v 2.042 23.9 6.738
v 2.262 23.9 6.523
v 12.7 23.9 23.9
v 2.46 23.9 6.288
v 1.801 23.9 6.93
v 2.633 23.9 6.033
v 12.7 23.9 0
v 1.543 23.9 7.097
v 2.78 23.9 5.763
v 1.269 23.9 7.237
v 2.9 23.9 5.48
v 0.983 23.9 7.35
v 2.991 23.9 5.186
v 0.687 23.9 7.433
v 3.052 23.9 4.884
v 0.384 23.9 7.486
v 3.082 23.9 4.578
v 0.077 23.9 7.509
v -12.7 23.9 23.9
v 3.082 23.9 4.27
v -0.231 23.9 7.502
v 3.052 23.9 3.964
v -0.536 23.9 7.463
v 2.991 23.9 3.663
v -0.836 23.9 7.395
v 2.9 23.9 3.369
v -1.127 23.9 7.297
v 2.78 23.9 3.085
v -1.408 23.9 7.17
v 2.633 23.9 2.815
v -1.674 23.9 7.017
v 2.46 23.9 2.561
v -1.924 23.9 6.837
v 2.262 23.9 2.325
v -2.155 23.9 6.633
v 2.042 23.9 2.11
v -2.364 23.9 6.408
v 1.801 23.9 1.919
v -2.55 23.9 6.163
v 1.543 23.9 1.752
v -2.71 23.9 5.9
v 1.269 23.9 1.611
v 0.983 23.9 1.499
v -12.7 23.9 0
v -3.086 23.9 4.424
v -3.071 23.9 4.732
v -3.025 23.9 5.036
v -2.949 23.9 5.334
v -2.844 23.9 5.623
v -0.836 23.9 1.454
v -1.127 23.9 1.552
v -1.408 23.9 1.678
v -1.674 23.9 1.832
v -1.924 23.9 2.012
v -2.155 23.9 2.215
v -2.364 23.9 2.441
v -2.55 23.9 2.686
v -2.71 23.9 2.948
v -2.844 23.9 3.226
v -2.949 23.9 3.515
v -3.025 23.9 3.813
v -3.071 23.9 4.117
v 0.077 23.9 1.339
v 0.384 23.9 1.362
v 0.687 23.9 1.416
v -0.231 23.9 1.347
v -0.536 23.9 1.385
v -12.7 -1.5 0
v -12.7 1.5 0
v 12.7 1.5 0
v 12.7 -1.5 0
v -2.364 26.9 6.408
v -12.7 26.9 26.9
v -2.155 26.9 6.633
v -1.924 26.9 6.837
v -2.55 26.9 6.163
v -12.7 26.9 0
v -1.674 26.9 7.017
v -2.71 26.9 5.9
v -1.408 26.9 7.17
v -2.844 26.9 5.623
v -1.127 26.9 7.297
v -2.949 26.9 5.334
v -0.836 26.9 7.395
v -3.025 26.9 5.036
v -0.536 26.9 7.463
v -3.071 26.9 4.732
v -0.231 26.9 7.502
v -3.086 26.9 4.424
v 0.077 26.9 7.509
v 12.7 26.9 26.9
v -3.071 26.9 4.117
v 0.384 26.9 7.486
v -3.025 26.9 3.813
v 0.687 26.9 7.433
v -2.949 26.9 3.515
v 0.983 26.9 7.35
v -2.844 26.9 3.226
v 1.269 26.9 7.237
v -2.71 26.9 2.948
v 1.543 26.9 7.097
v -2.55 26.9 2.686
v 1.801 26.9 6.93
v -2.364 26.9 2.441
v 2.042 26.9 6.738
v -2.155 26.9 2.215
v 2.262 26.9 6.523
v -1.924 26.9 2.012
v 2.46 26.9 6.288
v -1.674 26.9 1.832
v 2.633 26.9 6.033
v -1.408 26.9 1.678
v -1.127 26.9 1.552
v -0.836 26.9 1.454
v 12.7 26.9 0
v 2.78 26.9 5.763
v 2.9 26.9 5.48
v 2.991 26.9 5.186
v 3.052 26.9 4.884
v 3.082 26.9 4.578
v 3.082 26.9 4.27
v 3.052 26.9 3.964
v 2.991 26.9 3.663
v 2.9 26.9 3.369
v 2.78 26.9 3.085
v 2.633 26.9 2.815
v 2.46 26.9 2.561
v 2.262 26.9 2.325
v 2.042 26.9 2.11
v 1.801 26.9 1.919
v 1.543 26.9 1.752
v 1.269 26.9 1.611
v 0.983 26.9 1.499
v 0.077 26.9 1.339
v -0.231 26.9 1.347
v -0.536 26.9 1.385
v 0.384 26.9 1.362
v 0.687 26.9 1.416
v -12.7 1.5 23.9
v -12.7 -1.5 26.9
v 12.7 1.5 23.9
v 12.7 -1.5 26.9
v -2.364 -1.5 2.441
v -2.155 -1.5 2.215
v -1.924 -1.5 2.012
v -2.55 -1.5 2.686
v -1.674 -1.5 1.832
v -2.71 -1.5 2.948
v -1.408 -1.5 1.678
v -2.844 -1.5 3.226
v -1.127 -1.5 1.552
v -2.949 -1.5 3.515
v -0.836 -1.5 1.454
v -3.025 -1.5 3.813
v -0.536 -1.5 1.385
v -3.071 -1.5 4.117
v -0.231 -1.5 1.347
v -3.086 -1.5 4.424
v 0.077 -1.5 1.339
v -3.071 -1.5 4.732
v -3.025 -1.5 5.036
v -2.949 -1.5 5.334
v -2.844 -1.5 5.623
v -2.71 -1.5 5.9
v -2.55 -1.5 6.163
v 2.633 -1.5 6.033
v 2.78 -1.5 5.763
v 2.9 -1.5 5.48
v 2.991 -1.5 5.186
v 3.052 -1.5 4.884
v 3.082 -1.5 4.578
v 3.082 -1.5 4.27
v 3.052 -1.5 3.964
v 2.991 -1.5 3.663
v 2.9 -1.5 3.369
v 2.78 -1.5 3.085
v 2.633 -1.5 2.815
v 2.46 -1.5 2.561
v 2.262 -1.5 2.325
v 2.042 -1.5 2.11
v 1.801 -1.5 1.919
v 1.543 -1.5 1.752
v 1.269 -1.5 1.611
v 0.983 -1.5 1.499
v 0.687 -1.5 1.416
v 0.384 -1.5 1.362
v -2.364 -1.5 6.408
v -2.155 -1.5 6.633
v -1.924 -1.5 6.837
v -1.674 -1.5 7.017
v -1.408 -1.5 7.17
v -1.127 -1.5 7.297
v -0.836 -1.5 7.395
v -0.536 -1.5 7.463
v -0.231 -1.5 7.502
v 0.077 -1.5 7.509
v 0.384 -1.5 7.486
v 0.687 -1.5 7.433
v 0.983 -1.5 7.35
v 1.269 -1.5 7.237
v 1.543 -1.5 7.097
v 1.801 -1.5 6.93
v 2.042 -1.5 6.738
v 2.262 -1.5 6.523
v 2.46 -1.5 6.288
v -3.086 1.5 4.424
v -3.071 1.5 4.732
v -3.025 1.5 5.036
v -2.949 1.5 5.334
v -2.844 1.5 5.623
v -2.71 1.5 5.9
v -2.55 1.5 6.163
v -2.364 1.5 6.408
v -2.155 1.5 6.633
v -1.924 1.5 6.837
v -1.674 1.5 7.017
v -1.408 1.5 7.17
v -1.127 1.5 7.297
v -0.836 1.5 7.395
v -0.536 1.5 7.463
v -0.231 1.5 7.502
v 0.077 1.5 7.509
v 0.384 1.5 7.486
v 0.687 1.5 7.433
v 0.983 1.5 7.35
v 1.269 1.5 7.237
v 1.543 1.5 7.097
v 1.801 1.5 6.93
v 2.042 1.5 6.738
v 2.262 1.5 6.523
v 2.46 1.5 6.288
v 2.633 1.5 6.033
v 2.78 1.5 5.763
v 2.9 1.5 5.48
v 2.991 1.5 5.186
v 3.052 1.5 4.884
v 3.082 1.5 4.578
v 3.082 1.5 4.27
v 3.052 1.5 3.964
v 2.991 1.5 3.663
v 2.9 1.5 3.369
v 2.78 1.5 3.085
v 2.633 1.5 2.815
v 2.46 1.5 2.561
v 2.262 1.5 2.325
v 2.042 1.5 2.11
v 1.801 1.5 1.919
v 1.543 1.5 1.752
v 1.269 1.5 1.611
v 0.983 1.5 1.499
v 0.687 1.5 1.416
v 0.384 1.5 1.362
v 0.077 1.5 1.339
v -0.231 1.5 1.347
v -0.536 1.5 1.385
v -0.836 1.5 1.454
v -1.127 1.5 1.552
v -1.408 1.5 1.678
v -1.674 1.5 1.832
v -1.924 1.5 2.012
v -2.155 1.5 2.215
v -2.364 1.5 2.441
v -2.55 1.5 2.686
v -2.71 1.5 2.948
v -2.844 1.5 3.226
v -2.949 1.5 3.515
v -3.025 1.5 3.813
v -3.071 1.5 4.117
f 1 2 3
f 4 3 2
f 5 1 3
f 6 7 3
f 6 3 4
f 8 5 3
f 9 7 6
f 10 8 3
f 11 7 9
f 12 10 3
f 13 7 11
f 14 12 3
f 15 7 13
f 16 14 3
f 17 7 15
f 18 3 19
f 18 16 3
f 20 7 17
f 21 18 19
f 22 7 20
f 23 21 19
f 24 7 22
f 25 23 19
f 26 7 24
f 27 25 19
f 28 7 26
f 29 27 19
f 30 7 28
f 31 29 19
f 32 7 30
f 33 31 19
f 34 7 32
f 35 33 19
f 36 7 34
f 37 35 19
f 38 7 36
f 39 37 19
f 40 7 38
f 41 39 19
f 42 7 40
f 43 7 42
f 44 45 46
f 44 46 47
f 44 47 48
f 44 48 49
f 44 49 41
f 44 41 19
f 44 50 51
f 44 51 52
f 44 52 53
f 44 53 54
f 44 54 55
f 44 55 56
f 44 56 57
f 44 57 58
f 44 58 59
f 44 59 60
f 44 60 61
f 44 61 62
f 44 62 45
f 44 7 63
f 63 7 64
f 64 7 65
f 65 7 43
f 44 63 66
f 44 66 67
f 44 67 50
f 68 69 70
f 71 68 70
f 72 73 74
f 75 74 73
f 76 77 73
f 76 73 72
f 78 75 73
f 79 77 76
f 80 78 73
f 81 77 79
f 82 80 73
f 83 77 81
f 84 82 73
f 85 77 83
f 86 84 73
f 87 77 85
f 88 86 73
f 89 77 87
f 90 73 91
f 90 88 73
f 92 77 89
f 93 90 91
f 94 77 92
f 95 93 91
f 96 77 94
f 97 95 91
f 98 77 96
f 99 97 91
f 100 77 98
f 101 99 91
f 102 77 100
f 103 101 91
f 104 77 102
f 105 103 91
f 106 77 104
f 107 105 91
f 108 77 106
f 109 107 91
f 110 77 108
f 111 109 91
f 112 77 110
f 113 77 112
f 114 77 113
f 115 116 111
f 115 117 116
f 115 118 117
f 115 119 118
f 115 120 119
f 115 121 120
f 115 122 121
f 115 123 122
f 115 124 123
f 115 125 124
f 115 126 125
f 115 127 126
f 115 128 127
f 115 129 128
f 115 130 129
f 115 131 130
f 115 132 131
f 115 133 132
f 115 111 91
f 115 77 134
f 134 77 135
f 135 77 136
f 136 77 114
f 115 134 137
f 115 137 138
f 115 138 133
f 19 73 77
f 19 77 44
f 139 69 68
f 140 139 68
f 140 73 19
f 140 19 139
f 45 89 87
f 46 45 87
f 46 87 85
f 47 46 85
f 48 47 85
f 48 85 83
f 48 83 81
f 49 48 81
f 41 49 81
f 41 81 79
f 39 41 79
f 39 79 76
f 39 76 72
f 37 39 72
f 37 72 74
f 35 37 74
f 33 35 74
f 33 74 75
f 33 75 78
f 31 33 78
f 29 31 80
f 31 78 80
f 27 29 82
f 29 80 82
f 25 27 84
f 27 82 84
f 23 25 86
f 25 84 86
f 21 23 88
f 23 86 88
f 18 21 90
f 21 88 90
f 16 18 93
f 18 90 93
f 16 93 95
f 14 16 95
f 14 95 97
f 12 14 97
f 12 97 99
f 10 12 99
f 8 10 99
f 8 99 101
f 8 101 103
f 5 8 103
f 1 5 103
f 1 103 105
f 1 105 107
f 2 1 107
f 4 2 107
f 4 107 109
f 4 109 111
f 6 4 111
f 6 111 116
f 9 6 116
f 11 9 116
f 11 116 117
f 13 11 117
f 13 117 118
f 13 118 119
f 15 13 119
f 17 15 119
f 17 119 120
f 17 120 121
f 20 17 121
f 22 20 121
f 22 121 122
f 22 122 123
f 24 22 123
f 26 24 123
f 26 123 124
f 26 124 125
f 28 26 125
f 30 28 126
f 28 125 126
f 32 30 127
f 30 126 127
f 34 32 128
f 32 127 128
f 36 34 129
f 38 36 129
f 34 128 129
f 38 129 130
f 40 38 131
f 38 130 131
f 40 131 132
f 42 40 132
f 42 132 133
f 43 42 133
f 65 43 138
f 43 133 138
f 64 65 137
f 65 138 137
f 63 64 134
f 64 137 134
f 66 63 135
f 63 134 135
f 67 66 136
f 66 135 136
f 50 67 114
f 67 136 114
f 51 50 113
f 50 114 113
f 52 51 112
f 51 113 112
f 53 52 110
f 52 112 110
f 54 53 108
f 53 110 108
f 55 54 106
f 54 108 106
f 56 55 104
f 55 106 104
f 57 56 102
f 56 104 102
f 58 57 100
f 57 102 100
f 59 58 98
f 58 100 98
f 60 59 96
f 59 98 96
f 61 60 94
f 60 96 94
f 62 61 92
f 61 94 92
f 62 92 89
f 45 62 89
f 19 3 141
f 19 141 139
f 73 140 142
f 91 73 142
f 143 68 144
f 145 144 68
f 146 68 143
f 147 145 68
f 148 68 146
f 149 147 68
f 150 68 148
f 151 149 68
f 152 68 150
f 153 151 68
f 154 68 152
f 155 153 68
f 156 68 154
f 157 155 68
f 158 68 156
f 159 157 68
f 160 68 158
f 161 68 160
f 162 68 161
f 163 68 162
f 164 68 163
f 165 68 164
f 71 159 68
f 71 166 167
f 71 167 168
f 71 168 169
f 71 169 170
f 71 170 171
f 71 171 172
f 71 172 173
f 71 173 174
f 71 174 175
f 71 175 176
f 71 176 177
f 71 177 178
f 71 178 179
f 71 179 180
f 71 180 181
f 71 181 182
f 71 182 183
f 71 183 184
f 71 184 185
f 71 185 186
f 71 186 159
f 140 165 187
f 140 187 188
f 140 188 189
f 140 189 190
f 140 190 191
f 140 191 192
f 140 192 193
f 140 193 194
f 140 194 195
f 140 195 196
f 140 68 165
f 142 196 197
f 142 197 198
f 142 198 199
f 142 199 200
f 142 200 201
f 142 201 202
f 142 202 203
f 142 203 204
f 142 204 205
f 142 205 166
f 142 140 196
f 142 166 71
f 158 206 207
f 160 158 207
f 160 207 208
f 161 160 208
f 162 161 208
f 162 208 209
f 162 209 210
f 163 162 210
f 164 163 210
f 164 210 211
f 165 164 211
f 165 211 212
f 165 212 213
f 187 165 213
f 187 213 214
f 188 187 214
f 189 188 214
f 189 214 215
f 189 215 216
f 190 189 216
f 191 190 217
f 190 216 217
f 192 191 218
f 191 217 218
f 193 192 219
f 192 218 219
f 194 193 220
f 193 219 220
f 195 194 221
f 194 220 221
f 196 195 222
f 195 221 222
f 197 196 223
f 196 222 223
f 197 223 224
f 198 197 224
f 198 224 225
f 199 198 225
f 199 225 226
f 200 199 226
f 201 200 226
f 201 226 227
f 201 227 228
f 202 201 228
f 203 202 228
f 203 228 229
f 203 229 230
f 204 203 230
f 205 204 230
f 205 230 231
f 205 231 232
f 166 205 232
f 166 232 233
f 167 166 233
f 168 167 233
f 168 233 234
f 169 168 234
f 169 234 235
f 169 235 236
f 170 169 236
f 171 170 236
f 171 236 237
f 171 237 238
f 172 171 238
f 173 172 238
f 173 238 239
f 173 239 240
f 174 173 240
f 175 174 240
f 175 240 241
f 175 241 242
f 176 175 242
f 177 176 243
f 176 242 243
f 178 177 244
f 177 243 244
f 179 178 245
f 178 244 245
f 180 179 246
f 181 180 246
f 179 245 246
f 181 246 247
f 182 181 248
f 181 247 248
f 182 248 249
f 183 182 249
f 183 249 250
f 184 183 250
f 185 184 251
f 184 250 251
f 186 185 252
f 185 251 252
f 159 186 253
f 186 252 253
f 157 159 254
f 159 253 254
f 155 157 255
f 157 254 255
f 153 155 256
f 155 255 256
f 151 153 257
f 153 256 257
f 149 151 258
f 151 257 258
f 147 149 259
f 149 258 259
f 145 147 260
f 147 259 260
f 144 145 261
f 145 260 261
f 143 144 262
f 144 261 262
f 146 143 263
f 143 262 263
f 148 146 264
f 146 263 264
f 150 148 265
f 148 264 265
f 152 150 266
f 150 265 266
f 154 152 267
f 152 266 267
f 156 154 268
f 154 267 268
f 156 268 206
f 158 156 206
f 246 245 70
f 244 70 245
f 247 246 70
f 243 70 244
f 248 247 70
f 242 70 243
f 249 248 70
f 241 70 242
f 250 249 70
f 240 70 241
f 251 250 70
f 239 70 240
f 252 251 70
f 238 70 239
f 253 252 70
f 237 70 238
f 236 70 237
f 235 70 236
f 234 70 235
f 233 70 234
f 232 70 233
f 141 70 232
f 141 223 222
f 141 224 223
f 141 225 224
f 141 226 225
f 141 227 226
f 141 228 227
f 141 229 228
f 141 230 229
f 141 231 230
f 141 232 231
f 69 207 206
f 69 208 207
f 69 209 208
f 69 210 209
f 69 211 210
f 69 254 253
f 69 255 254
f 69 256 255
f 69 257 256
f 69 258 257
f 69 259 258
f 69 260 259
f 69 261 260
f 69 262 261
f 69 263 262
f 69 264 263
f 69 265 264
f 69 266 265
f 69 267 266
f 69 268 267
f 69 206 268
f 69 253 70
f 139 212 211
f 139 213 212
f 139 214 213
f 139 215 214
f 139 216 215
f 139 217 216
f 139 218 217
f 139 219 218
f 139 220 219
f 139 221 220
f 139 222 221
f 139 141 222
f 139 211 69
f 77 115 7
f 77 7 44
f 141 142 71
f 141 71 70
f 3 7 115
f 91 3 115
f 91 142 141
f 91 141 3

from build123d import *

# Parameters (mm, degrees)
F1_W     = 25.4
F1_H     = 3
F3_R     = 3.0860112986
F4_DEPTH = 48.3815874904


with BuildPart() as f2:
    # F2: sweep along a path in F0
    with BuildLine(Plane.YZ) as f2_path:
        Line((0, 0), (0, 25.4))
        Line((0, 25.4), (25.4, 25.4))
        Line((25.4, 25.4), (25.4, 0))
    # F1 (on Top) → F2 (sweep)
    with BuildSketch(Plane.XY):
        Rectangle(F1_W, F1_H)
    sweep(path=f2_path.line, transition=Transition.RIGHT)

    # F3 (on face) → F4 (cut)
    with BuildSketch(Plane(origin=(0, 26.9, 0), x_dir=(-1, 0, 0), z_dir=(0, 1, 0))):
        with Locations((0, 4.4242767617)):
            Circle(F3_R)
    extrude(amount=-F4_DEPTH, mode=Mode.SUBTRACT)


solid = f2.part
